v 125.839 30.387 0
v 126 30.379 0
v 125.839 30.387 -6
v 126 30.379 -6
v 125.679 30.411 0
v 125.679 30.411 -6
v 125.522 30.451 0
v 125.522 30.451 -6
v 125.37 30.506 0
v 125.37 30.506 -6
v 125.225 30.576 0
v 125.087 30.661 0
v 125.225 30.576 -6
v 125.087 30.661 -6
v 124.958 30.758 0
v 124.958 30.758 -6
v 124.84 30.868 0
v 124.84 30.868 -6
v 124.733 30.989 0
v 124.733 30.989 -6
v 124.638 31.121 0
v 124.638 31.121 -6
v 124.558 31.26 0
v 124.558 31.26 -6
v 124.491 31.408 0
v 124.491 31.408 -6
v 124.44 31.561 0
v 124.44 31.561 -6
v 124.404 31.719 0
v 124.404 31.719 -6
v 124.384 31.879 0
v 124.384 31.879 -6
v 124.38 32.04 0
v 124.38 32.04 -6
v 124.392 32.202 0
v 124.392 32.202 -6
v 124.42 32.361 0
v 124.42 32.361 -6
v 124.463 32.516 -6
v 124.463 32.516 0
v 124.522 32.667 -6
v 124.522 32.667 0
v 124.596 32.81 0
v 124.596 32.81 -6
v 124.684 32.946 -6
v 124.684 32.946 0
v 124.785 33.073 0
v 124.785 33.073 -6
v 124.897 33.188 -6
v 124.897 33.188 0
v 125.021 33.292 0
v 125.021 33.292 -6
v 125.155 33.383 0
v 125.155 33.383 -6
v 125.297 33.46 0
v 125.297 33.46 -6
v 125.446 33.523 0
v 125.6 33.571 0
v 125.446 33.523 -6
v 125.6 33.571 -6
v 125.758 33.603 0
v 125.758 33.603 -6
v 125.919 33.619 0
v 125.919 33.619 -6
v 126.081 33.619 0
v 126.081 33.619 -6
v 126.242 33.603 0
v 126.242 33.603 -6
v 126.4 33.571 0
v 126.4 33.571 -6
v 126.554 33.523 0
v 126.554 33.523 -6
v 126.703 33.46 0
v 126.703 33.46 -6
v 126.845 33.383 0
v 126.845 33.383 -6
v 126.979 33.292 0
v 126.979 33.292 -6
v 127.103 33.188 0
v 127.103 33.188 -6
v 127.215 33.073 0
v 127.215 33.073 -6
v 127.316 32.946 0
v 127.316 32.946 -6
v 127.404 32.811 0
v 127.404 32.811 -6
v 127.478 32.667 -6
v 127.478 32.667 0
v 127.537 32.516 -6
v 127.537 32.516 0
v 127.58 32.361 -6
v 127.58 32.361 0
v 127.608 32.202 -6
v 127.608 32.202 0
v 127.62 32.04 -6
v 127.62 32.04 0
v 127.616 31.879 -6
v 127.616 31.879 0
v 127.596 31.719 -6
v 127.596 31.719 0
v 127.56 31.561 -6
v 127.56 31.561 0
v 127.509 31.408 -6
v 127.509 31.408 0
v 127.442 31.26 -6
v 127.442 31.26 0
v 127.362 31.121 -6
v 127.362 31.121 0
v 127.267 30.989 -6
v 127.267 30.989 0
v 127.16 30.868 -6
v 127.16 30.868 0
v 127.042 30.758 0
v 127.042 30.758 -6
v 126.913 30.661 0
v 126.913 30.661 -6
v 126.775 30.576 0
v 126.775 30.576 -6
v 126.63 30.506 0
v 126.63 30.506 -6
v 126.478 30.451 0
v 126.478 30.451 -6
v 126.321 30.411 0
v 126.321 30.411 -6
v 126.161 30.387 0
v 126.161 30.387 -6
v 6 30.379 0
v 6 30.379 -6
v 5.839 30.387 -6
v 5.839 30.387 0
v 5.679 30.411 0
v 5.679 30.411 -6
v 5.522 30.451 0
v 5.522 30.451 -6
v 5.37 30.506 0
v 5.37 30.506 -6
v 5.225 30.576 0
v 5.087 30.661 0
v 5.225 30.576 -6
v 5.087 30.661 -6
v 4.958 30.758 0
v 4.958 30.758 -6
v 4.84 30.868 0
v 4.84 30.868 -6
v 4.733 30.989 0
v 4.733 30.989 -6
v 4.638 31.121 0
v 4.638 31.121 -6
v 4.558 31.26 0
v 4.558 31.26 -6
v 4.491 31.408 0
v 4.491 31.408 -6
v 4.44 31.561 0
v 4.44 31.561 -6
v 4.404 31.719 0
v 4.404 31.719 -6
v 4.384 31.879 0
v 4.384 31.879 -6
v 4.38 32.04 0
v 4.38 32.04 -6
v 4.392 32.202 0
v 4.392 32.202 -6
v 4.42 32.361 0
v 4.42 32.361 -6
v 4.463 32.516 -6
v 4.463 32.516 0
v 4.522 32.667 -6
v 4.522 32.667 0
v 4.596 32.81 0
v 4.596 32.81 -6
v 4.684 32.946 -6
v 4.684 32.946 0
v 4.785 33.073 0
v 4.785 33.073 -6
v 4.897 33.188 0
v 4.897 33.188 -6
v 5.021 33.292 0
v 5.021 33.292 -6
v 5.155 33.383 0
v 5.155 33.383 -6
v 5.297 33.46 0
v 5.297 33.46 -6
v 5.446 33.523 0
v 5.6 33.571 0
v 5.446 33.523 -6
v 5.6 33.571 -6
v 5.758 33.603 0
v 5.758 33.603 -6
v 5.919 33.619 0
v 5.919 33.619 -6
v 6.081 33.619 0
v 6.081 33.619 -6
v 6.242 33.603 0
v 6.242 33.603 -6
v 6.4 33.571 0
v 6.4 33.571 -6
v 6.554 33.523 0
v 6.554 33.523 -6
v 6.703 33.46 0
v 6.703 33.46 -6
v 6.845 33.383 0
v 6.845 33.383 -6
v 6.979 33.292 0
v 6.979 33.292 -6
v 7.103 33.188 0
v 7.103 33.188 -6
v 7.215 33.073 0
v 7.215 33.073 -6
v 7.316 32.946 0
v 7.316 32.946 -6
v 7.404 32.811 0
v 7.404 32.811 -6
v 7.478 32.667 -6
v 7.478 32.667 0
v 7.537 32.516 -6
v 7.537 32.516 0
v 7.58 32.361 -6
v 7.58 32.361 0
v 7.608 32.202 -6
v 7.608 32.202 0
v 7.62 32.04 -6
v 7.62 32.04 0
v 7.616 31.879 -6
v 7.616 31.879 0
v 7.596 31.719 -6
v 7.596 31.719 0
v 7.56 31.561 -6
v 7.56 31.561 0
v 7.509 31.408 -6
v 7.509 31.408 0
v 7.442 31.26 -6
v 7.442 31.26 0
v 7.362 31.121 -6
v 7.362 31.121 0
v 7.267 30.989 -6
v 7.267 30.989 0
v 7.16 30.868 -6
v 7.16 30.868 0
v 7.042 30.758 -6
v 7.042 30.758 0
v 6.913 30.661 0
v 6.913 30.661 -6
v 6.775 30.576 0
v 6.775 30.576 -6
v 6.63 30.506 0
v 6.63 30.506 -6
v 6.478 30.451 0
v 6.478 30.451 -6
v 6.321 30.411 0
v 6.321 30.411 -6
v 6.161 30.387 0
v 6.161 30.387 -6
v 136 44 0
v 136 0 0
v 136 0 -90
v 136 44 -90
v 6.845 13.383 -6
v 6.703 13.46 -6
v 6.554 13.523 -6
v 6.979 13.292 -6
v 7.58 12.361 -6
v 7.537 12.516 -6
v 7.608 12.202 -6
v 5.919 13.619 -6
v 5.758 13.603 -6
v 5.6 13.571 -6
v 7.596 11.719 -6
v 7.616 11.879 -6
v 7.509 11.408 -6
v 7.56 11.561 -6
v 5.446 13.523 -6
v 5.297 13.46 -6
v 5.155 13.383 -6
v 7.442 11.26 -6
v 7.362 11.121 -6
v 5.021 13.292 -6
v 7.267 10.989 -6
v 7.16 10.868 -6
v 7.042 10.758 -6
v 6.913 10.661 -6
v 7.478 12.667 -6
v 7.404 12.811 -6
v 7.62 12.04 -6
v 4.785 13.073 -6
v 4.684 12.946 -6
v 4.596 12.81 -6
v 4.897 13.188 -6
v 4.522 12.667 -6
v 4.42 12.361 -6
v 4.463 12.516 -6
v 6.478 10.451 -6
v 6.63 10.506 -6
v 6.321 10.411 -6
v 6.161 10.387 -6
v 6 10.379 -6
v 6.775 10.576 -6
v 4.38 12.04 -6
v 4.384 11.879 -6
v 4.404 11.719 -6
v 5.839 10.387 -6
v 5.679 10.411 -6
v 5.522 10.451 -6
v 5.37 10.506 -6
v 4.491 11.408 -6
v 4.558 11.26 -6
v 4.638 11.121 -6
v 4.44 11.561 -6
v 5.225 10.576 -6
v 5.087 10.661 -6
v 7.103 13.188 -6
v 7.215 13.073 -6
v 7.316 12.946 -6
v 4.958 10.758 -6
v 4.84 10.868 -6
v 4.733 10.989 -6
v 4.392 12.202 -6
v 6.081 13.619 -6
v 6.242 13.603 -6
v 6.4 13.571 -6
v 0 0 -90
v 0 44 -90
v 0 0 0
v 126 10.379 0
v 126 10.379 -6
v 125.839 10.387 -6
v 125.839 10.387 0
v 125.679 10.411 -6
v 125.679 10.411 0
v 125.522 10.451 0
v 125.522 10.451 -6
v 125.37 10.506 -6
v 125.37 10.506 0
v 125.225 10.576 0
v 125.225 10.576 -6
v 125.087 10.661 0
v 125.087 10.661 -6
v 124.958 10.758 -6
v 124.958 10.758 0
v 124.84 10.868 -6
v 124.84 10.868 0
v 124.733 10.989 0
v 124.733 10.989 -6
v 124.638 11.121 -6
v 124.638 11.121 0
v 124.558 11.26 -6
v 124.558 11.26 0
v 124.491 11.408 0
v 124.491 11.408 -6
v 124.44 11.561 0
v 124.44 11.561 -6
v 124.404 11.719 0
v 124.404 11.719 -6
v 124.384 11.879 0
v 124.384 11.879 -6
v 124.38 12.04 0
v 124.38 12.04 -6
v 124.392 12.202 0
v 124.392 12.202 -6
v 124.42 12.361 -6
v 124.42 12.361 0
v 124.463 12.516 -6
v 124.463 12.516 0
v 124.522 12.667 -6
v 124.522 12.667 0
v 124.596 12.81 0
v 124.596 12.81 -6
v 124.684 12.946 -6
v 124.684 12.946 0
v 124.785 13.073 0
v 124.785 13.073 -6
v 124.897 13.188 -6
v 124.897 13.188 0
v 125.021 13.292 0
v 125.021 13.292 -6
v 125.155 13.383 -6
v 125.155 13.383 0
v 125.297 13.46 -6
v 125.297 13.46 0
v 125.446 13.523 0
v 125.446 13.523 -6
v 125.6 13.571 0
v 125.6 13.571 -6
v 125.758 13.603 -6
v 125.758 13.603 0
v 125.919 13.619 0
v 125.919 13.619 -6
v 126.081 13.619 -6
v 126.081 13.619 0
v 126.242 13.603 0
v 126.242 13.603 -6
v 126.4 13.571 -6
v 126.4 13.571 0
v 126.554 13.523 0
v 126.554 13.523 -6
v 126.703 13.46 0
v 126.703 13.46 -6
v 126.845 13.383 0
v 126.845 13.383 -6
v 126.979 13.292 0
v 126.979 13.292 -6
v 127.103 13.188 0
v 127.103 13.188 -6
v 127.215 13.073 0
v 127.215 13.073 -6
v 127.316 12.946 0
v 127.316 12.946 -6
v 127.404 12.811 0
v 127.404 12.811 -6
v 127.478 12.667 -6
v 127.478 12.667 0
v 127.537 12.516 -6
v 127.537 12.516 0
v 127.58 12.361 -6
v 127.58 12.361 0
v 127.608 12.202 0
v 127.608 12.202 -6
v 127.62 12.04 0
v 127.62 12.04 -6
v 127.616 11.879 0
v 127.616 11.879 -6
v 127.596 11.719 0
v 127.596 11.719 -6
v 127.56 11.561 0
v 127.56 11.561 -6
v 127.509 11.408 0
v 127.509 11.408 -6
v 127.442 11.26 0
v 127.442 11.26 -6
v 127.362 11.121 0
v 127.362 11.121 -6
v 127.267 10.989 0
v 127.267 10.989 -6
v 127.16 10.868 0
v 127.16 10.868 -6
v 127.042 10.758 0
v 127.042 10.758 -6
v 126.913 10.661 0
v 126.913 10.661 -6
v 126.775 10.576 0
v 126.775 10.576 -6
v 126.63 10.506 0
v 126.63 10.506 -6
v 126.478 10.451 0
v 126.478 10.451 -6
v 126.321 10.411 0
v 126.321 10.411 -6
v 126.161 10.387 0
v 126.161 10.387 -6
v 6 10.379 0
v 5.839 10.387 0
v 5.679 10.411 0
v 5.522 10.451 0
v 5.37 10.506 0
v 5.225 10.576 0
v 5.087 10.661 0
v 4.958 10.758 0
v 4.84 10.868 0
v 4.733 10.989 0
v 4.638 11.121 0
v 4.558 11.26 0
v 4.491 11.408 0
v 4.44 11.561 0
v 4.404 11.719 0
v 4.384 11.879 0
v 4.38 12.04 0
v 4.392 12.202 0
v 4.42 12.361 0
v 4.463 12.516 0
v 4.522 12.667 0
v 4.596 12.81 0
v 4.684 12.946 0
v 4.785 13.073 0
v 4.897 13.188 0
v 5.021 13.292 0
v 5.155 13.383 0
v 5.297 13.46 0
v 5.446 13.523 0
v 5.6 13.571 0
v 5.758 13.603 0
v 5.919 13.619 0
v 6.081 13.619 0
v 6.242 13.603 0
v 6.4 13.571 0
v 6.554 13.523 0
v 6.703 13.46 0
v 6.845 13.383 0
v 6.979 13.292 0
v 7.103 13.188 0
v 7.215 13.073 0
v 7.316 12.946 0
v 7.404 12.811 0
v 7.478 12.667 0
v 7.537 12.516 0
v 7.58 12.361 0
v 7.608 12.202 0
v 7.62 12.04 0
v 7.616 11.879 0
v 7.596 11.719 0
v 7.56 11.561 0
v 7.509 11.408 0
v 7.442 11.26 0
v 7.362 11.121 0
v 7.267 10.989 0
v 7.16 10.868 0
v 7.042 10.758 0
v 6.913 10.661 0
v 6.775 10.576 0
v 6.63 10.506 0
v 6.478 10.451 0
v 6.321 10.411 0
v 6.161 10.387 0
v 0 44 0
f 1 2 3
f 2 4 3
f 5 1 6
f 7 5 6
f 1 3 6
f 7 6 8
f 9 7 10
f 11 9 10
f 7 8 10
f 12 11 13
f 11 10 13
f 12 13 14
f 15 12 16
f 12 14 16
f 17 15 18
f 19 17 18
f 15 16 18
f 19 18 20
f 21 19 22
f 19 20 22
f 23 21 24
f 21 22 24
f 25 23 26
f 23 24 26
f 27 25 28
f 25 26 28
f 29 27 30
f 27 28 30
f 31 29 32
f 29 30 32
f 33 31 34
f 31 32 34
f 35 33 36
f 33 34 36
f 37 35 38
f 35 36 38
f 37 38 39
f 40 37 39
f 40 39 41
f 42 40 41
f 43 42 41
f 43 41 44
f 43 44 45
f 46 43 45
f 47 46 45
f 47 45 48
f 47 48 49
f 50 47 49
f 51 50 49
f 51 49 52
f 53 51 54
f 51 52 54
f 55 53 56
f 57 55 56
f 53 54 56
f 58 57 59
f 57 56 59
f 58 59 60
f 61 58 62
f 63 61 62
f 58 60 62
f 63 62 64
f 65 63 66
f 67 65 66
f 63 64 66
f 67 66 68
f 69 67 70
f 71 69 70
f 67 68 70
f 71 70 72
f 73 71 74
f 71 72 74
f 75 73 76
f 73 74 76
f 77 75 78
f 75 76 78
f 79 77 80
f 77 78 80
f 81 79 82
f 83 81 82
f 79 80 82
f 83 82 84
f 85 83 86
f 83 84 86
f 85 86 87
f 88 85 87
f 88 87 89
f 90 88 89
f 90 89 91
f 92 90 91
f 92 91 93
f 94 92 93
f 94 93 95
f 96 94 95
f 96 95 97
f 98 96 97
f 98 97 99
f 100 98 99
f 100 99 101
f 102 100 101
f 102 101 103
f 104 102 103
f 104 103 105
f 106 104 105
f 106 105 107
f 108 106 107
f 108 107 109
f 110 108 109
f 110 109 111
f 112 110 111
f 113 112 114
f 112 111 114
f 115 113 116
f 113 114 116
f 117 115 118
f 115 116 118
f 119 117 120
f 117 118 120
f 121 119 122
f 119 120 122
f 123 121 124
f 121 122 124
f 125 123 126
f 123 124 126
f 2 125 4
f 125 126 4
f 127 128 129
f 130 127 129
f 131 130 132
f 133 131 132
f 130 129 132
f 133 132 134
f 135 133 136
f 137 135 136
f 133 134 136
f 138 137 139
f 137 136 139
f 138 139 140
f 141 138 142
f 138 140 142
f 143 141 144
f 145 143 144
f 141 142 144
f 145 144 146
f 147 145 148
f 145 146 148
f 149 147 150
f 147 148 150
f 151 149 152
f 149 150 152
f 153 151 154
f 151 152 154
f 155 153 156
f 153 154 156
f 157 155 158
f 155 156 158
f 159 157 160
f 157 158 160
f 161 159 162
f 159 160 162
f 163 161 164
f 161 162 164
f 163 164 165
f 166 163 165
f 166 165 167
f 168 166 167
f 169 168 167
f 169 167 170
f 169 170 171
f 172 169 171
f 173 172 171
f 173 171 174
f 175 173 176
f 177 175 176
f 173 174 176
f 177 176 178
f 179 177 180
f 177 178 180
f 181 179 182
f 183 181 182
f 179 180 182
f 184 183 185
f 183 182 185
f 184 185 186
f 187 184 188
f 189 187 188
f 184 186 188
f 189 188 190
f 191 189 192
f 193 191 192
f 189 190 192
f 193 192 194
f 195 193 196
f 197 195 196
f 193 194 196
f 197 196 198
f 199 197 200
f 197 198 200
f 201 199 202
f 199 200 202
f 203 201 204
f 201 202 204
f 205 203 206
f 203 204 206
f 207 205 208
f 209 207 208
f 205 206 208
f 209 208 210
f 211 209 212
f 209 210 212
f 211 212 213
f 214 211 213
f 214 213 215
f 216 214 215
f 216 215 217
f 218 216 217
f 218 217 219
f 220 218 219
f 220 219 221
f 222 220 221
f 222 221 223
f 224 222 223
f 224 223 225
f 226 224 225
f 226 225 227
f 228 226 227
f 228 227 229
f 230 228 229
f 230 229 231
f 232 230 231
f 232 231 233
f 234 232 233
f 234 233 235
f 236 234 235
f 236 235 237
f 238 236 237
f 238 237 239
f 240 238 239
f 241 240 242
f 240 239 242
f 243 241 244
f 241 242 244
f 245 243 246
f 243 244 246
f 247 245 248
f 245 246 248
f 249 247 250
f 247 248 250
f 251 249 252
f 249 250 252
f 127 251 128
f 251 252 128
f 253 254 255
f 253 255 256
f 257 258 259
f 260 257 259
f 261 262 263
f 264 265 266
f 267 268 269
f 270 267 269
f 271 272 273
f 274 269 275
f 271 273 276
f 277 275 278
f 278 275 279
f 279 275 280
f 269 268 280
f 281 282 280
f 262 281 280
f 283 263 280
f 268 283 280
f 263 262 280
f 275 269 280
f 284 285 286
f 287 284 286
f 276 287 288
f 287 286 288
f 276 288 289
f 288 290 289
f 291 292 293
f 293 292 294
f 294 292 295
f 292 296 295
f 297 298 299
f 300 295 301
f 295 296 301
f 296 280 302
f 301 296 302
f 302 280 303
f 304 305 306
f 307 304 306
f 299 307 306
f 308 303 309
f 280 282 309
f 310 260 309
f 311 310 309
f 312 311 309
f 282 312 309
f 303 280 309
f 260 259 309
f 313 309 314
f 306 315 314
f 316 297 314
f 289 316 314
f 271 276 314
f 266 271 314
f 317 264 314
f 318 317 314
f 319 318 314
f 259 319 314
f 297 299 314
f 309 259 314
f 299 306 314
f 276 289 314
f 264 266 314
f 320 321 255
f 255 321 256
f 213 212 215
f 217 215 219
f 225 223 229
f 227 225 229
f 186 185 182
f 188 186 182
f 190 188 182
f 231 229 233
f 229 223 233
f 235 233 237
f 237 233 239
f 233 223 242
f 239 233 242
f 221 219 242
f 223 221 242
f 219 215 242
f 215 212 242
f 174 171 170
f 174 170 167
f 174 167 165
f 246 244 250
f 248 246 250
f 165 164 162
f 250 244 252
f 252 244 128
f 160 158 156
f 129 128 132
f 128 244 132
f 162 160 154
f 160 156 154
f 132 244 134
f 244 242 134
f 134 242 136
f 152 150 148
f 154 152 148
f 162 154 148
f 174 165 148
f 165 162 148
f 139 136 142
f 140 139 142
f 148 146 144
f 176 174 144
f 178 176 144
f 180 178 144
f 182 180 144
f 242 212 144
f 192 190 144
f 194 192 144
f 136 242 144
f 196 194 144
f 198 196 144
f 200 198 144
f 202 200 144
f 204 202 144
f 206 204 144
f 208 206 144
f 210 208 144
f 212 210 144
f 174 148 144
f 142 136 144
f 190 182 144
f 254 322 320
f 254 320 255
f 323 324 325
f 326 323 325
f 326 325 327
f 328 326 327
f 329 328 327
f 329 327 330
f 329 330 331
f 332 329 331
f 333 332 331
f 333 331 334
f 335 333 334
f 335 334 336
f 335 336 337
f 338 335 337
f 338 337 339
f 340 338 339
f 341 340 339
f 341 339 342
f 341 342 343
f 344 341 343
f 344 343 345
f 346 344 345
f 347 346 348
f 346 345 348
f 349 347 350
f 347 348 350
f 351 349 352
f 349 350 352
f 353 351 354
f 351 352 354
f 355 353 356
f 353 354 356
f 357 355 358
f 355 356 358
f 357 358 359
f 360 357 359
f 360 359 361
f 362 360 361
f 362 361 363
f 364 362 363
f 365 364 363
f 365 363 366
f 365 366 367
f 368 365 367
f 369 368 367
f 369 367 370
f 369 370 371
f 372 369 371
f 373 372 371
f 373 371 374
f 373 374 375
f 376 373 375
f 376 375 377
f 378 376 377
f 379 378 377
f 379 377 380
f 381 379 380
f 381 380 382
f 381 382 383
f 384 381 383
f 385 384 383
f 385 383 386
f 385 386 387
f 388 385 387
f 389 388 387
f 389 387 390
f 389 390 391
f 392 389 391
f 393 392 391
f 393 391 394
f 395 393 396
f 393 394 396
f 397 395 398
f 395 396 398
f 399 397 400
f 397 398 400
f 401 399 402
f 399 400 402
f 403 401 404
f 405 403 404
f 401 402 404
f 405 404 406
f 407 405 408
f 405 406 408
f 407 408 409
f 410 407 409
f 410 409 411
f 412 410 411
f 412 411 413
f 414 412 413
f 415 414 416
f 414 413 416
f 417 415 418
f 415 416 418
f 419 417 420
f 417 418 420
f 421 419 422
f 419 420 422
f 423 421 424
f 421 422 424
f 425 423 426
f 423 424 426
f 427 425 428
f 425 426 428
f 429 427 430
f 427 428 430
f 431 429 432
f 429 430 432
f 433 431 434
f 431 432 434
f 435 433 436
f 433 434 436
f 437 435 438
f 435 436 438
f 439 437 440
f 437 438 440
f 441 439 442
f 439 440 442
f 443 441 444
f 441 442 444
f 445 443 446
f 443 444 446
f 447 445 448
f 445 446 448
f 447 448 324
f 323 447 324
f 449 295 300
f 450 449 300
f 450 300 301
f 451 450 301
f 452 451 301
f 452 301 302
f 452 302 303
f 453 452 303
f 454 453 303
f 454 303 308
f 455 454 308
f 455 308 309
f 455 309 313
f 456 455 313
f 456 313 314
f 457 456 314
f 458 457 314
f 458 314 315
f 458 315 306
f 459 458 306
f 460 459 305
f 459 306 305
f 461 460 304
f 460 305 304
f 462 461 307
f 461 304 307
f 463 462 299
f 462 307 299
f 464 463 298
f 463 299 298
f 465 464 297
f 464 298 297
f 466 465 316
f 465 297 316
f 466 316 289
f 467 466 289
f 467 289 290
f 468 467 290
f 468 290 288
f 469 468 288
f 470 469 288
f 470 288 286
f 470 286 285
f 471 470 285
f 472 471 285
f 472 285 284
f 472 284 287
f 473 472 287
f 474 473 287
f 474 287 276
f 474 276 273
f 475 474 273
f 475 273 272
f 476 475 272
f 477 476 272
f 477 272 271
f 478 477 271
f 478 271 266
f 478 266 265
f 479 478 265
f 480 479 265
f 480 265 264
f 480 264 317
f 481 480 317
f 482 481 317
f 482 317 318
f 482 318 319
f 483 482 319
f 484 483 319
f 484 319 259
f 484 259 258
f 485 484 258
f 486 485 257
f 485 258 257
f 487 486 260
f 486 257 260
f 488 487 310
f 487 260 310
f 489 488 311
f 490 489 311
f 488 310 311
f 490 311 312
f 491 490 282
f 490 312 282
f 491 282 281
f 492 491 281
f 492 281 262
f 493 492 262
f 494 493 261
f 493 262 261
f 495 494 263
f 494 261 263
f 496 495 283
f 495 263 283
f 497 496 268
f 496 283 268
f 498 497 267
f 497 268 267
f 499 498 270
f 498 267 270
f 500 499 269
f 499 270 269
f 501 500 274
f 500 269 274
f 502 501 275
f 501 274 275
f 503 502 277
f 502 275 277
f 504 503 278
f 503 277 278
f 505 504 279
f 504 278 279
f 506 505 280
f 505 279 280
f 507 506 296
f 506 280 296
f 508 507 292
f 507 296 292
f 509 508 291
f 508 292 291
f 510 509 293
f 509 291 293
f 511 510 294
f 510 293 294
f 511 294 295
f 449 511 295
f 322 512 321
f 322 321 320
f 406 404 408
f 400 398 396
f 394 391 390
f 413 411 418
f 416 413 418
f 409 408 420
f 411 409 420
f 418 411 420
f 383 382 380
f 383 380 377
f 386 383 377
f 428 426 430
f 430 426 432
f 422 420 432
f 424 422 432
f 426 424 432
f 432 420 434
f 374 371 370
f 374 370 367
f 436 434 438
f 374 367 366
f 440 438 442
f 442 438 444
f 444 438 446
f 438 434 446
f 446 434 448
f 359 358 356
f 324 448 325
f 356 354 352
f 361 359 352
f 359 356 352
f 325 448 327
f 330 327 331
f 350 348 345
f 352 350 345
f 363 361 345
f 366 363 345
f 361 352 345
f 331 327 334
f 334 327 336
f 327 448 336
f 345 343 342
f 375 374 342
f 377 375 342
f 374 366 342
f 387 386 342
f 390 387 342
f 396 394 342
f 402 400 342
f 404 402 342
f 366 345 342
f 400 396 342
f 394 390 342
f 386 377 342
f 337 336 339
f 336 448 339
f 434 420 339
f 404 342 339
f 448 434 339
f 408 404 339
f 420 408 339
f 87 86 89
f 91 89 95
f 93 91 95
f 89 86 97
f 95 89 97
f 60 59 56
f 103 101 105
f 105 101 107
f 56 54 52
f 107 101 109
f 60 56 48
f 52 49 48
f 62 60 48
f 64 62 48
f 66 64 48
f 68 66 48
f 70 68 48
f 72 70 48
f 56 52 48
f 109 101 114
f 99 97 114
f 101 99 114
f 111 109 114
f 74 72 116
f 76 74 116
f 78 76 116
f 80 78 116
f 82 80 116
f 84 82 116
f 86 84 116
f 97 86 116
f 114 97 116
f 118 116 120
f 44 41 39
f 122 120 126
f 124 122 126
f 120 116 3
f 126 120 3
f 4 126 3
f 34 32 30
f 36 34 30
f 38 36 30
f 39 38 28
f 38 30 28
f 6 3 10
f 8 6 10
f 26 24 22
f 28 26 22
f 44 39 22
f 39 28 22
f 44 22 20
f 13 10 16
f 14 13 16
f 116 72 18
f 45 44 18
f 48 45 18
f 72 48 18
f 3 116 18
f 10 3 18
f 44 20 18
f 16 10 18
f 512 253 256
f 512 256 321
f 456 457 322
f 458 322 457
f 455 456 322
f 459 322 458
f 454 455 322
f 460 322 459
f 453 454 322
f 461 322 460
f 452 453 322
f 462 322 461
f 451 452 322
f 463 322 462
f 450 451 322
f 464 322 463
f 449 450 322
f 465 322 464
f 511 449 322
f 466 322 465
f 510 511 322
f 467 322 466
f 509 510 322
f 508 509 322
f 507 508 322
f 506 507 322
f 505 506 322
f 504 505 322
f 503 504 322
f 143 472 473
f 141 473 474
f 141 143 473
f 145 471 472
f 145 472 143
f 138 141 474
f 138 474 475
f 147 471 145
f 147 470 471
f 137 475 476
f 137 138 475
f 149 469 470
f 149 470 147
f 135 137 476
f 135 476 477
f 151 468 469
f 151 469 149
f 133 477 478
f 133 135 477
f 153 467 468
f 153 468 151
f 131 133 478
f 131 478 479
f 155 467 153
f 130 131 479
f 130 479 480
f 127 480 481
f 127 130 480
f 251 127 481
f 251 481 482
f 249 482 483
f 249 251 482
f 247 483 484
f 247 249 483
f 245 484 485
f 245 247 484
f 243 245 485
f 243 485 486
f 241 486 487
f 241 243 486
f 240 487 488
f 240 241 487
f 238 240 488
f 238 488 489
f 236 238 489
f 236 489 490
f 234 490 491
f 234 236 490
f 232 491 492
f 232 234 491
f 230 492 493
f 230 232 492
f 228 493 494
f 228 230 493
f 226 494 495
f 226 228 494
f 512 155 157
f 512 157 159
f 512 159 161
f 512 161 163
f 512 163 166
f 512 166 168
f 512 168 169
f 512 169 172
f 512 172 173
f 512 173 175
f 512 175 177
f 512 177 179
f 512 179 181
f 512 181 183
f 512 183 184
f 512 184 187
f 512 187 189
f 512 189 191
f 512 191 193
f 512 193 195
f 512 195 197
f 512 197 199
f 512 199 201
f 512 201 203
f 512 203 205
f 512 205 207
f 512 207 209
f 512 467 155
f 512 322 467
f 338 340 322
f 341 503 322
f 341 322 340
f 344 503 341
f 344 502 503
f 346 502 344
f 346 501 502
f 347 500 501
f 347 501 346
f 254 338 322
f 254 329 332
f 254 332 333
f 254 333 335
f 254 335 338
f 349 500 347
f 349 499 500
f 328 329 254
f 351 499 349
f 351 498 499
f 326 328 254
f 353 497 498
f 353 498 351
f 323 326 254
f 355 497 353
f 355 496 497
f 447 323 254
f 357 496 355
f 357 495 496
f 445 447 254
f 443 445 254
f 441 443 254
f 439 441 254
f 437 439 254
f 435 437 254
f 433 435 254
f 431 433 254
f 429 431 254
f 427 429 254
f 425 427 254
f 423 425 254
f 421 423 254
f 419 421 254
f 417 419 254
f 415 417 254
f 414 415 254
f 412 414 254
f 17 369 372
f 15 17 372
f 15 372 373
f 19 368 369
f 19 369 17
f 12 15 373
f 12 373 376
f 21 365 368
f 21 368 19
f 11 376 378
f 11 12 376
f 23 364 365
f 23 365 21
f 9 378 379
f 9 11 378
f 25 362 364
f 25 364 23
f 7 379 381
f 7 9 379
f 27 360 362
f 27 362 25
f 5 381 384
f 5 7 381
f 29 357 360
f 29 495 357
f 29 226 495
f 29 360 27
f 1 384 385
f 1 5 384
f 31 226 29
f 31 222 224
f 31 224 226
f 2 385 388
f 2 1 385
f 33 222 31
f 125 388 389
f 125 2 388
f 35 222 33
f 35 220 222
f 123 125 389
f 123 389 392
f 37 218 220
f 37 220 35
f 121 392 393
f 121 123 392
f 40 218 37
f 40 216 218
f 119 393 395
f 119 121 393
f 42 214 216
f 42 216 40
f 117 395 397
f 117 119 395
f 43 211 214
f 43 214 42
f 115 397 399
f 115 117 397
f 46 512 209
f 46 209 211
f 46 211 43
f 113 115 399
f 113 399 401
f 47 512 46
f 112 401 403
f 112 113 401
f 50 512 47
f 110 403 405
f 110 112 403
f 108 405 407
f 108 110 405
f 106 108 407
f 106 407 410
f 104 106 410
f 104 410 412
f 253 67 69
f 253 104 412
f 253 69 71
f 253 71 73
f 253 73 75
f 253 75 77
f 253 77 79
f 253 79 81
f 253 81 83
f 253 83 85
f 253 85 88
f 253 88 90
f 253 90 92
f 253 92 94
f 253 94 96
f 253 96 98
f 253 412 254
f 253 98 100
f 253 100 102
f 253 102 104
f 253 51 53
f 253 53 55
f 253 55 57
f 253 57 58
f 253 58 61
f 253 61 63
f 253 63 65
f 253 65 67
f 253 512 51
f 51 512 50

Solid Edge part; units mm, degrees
sketch "Sketch1" plane through (0, 0, 0) normal (0, 0, 1) x (1, 0, 0)
  line L0 (136, 44) -> (0, 44)
  line L1 (0, 44) -> (0, 0)
  line L2 (0, 0) -> (136, 0)
  line L3 (136, 0) -> (136, 44)
extrude "Protrusion1" add sketch "Sketch1" against normal blind 90
hole "Hole1" at (126, 32, 0) direction (0, 0, -1) diameter 3.242 depth 6 thread major 4 thread length 2
hole "Hole2" at (126, 12, 0) direction (0, 0, -1) diameter 3.242 depth 6 thread major 4 thread length 2
hole "Hole3" at (6, 12, 0) direction (0, 0, -1) diameter 3.242 depth 6 thread major 4 thread length 2
hole "Hole4" at (6, 32, 0) direction (0, 0, -1) diameter 3.242 depth 6 thread major 4 thread length 2
